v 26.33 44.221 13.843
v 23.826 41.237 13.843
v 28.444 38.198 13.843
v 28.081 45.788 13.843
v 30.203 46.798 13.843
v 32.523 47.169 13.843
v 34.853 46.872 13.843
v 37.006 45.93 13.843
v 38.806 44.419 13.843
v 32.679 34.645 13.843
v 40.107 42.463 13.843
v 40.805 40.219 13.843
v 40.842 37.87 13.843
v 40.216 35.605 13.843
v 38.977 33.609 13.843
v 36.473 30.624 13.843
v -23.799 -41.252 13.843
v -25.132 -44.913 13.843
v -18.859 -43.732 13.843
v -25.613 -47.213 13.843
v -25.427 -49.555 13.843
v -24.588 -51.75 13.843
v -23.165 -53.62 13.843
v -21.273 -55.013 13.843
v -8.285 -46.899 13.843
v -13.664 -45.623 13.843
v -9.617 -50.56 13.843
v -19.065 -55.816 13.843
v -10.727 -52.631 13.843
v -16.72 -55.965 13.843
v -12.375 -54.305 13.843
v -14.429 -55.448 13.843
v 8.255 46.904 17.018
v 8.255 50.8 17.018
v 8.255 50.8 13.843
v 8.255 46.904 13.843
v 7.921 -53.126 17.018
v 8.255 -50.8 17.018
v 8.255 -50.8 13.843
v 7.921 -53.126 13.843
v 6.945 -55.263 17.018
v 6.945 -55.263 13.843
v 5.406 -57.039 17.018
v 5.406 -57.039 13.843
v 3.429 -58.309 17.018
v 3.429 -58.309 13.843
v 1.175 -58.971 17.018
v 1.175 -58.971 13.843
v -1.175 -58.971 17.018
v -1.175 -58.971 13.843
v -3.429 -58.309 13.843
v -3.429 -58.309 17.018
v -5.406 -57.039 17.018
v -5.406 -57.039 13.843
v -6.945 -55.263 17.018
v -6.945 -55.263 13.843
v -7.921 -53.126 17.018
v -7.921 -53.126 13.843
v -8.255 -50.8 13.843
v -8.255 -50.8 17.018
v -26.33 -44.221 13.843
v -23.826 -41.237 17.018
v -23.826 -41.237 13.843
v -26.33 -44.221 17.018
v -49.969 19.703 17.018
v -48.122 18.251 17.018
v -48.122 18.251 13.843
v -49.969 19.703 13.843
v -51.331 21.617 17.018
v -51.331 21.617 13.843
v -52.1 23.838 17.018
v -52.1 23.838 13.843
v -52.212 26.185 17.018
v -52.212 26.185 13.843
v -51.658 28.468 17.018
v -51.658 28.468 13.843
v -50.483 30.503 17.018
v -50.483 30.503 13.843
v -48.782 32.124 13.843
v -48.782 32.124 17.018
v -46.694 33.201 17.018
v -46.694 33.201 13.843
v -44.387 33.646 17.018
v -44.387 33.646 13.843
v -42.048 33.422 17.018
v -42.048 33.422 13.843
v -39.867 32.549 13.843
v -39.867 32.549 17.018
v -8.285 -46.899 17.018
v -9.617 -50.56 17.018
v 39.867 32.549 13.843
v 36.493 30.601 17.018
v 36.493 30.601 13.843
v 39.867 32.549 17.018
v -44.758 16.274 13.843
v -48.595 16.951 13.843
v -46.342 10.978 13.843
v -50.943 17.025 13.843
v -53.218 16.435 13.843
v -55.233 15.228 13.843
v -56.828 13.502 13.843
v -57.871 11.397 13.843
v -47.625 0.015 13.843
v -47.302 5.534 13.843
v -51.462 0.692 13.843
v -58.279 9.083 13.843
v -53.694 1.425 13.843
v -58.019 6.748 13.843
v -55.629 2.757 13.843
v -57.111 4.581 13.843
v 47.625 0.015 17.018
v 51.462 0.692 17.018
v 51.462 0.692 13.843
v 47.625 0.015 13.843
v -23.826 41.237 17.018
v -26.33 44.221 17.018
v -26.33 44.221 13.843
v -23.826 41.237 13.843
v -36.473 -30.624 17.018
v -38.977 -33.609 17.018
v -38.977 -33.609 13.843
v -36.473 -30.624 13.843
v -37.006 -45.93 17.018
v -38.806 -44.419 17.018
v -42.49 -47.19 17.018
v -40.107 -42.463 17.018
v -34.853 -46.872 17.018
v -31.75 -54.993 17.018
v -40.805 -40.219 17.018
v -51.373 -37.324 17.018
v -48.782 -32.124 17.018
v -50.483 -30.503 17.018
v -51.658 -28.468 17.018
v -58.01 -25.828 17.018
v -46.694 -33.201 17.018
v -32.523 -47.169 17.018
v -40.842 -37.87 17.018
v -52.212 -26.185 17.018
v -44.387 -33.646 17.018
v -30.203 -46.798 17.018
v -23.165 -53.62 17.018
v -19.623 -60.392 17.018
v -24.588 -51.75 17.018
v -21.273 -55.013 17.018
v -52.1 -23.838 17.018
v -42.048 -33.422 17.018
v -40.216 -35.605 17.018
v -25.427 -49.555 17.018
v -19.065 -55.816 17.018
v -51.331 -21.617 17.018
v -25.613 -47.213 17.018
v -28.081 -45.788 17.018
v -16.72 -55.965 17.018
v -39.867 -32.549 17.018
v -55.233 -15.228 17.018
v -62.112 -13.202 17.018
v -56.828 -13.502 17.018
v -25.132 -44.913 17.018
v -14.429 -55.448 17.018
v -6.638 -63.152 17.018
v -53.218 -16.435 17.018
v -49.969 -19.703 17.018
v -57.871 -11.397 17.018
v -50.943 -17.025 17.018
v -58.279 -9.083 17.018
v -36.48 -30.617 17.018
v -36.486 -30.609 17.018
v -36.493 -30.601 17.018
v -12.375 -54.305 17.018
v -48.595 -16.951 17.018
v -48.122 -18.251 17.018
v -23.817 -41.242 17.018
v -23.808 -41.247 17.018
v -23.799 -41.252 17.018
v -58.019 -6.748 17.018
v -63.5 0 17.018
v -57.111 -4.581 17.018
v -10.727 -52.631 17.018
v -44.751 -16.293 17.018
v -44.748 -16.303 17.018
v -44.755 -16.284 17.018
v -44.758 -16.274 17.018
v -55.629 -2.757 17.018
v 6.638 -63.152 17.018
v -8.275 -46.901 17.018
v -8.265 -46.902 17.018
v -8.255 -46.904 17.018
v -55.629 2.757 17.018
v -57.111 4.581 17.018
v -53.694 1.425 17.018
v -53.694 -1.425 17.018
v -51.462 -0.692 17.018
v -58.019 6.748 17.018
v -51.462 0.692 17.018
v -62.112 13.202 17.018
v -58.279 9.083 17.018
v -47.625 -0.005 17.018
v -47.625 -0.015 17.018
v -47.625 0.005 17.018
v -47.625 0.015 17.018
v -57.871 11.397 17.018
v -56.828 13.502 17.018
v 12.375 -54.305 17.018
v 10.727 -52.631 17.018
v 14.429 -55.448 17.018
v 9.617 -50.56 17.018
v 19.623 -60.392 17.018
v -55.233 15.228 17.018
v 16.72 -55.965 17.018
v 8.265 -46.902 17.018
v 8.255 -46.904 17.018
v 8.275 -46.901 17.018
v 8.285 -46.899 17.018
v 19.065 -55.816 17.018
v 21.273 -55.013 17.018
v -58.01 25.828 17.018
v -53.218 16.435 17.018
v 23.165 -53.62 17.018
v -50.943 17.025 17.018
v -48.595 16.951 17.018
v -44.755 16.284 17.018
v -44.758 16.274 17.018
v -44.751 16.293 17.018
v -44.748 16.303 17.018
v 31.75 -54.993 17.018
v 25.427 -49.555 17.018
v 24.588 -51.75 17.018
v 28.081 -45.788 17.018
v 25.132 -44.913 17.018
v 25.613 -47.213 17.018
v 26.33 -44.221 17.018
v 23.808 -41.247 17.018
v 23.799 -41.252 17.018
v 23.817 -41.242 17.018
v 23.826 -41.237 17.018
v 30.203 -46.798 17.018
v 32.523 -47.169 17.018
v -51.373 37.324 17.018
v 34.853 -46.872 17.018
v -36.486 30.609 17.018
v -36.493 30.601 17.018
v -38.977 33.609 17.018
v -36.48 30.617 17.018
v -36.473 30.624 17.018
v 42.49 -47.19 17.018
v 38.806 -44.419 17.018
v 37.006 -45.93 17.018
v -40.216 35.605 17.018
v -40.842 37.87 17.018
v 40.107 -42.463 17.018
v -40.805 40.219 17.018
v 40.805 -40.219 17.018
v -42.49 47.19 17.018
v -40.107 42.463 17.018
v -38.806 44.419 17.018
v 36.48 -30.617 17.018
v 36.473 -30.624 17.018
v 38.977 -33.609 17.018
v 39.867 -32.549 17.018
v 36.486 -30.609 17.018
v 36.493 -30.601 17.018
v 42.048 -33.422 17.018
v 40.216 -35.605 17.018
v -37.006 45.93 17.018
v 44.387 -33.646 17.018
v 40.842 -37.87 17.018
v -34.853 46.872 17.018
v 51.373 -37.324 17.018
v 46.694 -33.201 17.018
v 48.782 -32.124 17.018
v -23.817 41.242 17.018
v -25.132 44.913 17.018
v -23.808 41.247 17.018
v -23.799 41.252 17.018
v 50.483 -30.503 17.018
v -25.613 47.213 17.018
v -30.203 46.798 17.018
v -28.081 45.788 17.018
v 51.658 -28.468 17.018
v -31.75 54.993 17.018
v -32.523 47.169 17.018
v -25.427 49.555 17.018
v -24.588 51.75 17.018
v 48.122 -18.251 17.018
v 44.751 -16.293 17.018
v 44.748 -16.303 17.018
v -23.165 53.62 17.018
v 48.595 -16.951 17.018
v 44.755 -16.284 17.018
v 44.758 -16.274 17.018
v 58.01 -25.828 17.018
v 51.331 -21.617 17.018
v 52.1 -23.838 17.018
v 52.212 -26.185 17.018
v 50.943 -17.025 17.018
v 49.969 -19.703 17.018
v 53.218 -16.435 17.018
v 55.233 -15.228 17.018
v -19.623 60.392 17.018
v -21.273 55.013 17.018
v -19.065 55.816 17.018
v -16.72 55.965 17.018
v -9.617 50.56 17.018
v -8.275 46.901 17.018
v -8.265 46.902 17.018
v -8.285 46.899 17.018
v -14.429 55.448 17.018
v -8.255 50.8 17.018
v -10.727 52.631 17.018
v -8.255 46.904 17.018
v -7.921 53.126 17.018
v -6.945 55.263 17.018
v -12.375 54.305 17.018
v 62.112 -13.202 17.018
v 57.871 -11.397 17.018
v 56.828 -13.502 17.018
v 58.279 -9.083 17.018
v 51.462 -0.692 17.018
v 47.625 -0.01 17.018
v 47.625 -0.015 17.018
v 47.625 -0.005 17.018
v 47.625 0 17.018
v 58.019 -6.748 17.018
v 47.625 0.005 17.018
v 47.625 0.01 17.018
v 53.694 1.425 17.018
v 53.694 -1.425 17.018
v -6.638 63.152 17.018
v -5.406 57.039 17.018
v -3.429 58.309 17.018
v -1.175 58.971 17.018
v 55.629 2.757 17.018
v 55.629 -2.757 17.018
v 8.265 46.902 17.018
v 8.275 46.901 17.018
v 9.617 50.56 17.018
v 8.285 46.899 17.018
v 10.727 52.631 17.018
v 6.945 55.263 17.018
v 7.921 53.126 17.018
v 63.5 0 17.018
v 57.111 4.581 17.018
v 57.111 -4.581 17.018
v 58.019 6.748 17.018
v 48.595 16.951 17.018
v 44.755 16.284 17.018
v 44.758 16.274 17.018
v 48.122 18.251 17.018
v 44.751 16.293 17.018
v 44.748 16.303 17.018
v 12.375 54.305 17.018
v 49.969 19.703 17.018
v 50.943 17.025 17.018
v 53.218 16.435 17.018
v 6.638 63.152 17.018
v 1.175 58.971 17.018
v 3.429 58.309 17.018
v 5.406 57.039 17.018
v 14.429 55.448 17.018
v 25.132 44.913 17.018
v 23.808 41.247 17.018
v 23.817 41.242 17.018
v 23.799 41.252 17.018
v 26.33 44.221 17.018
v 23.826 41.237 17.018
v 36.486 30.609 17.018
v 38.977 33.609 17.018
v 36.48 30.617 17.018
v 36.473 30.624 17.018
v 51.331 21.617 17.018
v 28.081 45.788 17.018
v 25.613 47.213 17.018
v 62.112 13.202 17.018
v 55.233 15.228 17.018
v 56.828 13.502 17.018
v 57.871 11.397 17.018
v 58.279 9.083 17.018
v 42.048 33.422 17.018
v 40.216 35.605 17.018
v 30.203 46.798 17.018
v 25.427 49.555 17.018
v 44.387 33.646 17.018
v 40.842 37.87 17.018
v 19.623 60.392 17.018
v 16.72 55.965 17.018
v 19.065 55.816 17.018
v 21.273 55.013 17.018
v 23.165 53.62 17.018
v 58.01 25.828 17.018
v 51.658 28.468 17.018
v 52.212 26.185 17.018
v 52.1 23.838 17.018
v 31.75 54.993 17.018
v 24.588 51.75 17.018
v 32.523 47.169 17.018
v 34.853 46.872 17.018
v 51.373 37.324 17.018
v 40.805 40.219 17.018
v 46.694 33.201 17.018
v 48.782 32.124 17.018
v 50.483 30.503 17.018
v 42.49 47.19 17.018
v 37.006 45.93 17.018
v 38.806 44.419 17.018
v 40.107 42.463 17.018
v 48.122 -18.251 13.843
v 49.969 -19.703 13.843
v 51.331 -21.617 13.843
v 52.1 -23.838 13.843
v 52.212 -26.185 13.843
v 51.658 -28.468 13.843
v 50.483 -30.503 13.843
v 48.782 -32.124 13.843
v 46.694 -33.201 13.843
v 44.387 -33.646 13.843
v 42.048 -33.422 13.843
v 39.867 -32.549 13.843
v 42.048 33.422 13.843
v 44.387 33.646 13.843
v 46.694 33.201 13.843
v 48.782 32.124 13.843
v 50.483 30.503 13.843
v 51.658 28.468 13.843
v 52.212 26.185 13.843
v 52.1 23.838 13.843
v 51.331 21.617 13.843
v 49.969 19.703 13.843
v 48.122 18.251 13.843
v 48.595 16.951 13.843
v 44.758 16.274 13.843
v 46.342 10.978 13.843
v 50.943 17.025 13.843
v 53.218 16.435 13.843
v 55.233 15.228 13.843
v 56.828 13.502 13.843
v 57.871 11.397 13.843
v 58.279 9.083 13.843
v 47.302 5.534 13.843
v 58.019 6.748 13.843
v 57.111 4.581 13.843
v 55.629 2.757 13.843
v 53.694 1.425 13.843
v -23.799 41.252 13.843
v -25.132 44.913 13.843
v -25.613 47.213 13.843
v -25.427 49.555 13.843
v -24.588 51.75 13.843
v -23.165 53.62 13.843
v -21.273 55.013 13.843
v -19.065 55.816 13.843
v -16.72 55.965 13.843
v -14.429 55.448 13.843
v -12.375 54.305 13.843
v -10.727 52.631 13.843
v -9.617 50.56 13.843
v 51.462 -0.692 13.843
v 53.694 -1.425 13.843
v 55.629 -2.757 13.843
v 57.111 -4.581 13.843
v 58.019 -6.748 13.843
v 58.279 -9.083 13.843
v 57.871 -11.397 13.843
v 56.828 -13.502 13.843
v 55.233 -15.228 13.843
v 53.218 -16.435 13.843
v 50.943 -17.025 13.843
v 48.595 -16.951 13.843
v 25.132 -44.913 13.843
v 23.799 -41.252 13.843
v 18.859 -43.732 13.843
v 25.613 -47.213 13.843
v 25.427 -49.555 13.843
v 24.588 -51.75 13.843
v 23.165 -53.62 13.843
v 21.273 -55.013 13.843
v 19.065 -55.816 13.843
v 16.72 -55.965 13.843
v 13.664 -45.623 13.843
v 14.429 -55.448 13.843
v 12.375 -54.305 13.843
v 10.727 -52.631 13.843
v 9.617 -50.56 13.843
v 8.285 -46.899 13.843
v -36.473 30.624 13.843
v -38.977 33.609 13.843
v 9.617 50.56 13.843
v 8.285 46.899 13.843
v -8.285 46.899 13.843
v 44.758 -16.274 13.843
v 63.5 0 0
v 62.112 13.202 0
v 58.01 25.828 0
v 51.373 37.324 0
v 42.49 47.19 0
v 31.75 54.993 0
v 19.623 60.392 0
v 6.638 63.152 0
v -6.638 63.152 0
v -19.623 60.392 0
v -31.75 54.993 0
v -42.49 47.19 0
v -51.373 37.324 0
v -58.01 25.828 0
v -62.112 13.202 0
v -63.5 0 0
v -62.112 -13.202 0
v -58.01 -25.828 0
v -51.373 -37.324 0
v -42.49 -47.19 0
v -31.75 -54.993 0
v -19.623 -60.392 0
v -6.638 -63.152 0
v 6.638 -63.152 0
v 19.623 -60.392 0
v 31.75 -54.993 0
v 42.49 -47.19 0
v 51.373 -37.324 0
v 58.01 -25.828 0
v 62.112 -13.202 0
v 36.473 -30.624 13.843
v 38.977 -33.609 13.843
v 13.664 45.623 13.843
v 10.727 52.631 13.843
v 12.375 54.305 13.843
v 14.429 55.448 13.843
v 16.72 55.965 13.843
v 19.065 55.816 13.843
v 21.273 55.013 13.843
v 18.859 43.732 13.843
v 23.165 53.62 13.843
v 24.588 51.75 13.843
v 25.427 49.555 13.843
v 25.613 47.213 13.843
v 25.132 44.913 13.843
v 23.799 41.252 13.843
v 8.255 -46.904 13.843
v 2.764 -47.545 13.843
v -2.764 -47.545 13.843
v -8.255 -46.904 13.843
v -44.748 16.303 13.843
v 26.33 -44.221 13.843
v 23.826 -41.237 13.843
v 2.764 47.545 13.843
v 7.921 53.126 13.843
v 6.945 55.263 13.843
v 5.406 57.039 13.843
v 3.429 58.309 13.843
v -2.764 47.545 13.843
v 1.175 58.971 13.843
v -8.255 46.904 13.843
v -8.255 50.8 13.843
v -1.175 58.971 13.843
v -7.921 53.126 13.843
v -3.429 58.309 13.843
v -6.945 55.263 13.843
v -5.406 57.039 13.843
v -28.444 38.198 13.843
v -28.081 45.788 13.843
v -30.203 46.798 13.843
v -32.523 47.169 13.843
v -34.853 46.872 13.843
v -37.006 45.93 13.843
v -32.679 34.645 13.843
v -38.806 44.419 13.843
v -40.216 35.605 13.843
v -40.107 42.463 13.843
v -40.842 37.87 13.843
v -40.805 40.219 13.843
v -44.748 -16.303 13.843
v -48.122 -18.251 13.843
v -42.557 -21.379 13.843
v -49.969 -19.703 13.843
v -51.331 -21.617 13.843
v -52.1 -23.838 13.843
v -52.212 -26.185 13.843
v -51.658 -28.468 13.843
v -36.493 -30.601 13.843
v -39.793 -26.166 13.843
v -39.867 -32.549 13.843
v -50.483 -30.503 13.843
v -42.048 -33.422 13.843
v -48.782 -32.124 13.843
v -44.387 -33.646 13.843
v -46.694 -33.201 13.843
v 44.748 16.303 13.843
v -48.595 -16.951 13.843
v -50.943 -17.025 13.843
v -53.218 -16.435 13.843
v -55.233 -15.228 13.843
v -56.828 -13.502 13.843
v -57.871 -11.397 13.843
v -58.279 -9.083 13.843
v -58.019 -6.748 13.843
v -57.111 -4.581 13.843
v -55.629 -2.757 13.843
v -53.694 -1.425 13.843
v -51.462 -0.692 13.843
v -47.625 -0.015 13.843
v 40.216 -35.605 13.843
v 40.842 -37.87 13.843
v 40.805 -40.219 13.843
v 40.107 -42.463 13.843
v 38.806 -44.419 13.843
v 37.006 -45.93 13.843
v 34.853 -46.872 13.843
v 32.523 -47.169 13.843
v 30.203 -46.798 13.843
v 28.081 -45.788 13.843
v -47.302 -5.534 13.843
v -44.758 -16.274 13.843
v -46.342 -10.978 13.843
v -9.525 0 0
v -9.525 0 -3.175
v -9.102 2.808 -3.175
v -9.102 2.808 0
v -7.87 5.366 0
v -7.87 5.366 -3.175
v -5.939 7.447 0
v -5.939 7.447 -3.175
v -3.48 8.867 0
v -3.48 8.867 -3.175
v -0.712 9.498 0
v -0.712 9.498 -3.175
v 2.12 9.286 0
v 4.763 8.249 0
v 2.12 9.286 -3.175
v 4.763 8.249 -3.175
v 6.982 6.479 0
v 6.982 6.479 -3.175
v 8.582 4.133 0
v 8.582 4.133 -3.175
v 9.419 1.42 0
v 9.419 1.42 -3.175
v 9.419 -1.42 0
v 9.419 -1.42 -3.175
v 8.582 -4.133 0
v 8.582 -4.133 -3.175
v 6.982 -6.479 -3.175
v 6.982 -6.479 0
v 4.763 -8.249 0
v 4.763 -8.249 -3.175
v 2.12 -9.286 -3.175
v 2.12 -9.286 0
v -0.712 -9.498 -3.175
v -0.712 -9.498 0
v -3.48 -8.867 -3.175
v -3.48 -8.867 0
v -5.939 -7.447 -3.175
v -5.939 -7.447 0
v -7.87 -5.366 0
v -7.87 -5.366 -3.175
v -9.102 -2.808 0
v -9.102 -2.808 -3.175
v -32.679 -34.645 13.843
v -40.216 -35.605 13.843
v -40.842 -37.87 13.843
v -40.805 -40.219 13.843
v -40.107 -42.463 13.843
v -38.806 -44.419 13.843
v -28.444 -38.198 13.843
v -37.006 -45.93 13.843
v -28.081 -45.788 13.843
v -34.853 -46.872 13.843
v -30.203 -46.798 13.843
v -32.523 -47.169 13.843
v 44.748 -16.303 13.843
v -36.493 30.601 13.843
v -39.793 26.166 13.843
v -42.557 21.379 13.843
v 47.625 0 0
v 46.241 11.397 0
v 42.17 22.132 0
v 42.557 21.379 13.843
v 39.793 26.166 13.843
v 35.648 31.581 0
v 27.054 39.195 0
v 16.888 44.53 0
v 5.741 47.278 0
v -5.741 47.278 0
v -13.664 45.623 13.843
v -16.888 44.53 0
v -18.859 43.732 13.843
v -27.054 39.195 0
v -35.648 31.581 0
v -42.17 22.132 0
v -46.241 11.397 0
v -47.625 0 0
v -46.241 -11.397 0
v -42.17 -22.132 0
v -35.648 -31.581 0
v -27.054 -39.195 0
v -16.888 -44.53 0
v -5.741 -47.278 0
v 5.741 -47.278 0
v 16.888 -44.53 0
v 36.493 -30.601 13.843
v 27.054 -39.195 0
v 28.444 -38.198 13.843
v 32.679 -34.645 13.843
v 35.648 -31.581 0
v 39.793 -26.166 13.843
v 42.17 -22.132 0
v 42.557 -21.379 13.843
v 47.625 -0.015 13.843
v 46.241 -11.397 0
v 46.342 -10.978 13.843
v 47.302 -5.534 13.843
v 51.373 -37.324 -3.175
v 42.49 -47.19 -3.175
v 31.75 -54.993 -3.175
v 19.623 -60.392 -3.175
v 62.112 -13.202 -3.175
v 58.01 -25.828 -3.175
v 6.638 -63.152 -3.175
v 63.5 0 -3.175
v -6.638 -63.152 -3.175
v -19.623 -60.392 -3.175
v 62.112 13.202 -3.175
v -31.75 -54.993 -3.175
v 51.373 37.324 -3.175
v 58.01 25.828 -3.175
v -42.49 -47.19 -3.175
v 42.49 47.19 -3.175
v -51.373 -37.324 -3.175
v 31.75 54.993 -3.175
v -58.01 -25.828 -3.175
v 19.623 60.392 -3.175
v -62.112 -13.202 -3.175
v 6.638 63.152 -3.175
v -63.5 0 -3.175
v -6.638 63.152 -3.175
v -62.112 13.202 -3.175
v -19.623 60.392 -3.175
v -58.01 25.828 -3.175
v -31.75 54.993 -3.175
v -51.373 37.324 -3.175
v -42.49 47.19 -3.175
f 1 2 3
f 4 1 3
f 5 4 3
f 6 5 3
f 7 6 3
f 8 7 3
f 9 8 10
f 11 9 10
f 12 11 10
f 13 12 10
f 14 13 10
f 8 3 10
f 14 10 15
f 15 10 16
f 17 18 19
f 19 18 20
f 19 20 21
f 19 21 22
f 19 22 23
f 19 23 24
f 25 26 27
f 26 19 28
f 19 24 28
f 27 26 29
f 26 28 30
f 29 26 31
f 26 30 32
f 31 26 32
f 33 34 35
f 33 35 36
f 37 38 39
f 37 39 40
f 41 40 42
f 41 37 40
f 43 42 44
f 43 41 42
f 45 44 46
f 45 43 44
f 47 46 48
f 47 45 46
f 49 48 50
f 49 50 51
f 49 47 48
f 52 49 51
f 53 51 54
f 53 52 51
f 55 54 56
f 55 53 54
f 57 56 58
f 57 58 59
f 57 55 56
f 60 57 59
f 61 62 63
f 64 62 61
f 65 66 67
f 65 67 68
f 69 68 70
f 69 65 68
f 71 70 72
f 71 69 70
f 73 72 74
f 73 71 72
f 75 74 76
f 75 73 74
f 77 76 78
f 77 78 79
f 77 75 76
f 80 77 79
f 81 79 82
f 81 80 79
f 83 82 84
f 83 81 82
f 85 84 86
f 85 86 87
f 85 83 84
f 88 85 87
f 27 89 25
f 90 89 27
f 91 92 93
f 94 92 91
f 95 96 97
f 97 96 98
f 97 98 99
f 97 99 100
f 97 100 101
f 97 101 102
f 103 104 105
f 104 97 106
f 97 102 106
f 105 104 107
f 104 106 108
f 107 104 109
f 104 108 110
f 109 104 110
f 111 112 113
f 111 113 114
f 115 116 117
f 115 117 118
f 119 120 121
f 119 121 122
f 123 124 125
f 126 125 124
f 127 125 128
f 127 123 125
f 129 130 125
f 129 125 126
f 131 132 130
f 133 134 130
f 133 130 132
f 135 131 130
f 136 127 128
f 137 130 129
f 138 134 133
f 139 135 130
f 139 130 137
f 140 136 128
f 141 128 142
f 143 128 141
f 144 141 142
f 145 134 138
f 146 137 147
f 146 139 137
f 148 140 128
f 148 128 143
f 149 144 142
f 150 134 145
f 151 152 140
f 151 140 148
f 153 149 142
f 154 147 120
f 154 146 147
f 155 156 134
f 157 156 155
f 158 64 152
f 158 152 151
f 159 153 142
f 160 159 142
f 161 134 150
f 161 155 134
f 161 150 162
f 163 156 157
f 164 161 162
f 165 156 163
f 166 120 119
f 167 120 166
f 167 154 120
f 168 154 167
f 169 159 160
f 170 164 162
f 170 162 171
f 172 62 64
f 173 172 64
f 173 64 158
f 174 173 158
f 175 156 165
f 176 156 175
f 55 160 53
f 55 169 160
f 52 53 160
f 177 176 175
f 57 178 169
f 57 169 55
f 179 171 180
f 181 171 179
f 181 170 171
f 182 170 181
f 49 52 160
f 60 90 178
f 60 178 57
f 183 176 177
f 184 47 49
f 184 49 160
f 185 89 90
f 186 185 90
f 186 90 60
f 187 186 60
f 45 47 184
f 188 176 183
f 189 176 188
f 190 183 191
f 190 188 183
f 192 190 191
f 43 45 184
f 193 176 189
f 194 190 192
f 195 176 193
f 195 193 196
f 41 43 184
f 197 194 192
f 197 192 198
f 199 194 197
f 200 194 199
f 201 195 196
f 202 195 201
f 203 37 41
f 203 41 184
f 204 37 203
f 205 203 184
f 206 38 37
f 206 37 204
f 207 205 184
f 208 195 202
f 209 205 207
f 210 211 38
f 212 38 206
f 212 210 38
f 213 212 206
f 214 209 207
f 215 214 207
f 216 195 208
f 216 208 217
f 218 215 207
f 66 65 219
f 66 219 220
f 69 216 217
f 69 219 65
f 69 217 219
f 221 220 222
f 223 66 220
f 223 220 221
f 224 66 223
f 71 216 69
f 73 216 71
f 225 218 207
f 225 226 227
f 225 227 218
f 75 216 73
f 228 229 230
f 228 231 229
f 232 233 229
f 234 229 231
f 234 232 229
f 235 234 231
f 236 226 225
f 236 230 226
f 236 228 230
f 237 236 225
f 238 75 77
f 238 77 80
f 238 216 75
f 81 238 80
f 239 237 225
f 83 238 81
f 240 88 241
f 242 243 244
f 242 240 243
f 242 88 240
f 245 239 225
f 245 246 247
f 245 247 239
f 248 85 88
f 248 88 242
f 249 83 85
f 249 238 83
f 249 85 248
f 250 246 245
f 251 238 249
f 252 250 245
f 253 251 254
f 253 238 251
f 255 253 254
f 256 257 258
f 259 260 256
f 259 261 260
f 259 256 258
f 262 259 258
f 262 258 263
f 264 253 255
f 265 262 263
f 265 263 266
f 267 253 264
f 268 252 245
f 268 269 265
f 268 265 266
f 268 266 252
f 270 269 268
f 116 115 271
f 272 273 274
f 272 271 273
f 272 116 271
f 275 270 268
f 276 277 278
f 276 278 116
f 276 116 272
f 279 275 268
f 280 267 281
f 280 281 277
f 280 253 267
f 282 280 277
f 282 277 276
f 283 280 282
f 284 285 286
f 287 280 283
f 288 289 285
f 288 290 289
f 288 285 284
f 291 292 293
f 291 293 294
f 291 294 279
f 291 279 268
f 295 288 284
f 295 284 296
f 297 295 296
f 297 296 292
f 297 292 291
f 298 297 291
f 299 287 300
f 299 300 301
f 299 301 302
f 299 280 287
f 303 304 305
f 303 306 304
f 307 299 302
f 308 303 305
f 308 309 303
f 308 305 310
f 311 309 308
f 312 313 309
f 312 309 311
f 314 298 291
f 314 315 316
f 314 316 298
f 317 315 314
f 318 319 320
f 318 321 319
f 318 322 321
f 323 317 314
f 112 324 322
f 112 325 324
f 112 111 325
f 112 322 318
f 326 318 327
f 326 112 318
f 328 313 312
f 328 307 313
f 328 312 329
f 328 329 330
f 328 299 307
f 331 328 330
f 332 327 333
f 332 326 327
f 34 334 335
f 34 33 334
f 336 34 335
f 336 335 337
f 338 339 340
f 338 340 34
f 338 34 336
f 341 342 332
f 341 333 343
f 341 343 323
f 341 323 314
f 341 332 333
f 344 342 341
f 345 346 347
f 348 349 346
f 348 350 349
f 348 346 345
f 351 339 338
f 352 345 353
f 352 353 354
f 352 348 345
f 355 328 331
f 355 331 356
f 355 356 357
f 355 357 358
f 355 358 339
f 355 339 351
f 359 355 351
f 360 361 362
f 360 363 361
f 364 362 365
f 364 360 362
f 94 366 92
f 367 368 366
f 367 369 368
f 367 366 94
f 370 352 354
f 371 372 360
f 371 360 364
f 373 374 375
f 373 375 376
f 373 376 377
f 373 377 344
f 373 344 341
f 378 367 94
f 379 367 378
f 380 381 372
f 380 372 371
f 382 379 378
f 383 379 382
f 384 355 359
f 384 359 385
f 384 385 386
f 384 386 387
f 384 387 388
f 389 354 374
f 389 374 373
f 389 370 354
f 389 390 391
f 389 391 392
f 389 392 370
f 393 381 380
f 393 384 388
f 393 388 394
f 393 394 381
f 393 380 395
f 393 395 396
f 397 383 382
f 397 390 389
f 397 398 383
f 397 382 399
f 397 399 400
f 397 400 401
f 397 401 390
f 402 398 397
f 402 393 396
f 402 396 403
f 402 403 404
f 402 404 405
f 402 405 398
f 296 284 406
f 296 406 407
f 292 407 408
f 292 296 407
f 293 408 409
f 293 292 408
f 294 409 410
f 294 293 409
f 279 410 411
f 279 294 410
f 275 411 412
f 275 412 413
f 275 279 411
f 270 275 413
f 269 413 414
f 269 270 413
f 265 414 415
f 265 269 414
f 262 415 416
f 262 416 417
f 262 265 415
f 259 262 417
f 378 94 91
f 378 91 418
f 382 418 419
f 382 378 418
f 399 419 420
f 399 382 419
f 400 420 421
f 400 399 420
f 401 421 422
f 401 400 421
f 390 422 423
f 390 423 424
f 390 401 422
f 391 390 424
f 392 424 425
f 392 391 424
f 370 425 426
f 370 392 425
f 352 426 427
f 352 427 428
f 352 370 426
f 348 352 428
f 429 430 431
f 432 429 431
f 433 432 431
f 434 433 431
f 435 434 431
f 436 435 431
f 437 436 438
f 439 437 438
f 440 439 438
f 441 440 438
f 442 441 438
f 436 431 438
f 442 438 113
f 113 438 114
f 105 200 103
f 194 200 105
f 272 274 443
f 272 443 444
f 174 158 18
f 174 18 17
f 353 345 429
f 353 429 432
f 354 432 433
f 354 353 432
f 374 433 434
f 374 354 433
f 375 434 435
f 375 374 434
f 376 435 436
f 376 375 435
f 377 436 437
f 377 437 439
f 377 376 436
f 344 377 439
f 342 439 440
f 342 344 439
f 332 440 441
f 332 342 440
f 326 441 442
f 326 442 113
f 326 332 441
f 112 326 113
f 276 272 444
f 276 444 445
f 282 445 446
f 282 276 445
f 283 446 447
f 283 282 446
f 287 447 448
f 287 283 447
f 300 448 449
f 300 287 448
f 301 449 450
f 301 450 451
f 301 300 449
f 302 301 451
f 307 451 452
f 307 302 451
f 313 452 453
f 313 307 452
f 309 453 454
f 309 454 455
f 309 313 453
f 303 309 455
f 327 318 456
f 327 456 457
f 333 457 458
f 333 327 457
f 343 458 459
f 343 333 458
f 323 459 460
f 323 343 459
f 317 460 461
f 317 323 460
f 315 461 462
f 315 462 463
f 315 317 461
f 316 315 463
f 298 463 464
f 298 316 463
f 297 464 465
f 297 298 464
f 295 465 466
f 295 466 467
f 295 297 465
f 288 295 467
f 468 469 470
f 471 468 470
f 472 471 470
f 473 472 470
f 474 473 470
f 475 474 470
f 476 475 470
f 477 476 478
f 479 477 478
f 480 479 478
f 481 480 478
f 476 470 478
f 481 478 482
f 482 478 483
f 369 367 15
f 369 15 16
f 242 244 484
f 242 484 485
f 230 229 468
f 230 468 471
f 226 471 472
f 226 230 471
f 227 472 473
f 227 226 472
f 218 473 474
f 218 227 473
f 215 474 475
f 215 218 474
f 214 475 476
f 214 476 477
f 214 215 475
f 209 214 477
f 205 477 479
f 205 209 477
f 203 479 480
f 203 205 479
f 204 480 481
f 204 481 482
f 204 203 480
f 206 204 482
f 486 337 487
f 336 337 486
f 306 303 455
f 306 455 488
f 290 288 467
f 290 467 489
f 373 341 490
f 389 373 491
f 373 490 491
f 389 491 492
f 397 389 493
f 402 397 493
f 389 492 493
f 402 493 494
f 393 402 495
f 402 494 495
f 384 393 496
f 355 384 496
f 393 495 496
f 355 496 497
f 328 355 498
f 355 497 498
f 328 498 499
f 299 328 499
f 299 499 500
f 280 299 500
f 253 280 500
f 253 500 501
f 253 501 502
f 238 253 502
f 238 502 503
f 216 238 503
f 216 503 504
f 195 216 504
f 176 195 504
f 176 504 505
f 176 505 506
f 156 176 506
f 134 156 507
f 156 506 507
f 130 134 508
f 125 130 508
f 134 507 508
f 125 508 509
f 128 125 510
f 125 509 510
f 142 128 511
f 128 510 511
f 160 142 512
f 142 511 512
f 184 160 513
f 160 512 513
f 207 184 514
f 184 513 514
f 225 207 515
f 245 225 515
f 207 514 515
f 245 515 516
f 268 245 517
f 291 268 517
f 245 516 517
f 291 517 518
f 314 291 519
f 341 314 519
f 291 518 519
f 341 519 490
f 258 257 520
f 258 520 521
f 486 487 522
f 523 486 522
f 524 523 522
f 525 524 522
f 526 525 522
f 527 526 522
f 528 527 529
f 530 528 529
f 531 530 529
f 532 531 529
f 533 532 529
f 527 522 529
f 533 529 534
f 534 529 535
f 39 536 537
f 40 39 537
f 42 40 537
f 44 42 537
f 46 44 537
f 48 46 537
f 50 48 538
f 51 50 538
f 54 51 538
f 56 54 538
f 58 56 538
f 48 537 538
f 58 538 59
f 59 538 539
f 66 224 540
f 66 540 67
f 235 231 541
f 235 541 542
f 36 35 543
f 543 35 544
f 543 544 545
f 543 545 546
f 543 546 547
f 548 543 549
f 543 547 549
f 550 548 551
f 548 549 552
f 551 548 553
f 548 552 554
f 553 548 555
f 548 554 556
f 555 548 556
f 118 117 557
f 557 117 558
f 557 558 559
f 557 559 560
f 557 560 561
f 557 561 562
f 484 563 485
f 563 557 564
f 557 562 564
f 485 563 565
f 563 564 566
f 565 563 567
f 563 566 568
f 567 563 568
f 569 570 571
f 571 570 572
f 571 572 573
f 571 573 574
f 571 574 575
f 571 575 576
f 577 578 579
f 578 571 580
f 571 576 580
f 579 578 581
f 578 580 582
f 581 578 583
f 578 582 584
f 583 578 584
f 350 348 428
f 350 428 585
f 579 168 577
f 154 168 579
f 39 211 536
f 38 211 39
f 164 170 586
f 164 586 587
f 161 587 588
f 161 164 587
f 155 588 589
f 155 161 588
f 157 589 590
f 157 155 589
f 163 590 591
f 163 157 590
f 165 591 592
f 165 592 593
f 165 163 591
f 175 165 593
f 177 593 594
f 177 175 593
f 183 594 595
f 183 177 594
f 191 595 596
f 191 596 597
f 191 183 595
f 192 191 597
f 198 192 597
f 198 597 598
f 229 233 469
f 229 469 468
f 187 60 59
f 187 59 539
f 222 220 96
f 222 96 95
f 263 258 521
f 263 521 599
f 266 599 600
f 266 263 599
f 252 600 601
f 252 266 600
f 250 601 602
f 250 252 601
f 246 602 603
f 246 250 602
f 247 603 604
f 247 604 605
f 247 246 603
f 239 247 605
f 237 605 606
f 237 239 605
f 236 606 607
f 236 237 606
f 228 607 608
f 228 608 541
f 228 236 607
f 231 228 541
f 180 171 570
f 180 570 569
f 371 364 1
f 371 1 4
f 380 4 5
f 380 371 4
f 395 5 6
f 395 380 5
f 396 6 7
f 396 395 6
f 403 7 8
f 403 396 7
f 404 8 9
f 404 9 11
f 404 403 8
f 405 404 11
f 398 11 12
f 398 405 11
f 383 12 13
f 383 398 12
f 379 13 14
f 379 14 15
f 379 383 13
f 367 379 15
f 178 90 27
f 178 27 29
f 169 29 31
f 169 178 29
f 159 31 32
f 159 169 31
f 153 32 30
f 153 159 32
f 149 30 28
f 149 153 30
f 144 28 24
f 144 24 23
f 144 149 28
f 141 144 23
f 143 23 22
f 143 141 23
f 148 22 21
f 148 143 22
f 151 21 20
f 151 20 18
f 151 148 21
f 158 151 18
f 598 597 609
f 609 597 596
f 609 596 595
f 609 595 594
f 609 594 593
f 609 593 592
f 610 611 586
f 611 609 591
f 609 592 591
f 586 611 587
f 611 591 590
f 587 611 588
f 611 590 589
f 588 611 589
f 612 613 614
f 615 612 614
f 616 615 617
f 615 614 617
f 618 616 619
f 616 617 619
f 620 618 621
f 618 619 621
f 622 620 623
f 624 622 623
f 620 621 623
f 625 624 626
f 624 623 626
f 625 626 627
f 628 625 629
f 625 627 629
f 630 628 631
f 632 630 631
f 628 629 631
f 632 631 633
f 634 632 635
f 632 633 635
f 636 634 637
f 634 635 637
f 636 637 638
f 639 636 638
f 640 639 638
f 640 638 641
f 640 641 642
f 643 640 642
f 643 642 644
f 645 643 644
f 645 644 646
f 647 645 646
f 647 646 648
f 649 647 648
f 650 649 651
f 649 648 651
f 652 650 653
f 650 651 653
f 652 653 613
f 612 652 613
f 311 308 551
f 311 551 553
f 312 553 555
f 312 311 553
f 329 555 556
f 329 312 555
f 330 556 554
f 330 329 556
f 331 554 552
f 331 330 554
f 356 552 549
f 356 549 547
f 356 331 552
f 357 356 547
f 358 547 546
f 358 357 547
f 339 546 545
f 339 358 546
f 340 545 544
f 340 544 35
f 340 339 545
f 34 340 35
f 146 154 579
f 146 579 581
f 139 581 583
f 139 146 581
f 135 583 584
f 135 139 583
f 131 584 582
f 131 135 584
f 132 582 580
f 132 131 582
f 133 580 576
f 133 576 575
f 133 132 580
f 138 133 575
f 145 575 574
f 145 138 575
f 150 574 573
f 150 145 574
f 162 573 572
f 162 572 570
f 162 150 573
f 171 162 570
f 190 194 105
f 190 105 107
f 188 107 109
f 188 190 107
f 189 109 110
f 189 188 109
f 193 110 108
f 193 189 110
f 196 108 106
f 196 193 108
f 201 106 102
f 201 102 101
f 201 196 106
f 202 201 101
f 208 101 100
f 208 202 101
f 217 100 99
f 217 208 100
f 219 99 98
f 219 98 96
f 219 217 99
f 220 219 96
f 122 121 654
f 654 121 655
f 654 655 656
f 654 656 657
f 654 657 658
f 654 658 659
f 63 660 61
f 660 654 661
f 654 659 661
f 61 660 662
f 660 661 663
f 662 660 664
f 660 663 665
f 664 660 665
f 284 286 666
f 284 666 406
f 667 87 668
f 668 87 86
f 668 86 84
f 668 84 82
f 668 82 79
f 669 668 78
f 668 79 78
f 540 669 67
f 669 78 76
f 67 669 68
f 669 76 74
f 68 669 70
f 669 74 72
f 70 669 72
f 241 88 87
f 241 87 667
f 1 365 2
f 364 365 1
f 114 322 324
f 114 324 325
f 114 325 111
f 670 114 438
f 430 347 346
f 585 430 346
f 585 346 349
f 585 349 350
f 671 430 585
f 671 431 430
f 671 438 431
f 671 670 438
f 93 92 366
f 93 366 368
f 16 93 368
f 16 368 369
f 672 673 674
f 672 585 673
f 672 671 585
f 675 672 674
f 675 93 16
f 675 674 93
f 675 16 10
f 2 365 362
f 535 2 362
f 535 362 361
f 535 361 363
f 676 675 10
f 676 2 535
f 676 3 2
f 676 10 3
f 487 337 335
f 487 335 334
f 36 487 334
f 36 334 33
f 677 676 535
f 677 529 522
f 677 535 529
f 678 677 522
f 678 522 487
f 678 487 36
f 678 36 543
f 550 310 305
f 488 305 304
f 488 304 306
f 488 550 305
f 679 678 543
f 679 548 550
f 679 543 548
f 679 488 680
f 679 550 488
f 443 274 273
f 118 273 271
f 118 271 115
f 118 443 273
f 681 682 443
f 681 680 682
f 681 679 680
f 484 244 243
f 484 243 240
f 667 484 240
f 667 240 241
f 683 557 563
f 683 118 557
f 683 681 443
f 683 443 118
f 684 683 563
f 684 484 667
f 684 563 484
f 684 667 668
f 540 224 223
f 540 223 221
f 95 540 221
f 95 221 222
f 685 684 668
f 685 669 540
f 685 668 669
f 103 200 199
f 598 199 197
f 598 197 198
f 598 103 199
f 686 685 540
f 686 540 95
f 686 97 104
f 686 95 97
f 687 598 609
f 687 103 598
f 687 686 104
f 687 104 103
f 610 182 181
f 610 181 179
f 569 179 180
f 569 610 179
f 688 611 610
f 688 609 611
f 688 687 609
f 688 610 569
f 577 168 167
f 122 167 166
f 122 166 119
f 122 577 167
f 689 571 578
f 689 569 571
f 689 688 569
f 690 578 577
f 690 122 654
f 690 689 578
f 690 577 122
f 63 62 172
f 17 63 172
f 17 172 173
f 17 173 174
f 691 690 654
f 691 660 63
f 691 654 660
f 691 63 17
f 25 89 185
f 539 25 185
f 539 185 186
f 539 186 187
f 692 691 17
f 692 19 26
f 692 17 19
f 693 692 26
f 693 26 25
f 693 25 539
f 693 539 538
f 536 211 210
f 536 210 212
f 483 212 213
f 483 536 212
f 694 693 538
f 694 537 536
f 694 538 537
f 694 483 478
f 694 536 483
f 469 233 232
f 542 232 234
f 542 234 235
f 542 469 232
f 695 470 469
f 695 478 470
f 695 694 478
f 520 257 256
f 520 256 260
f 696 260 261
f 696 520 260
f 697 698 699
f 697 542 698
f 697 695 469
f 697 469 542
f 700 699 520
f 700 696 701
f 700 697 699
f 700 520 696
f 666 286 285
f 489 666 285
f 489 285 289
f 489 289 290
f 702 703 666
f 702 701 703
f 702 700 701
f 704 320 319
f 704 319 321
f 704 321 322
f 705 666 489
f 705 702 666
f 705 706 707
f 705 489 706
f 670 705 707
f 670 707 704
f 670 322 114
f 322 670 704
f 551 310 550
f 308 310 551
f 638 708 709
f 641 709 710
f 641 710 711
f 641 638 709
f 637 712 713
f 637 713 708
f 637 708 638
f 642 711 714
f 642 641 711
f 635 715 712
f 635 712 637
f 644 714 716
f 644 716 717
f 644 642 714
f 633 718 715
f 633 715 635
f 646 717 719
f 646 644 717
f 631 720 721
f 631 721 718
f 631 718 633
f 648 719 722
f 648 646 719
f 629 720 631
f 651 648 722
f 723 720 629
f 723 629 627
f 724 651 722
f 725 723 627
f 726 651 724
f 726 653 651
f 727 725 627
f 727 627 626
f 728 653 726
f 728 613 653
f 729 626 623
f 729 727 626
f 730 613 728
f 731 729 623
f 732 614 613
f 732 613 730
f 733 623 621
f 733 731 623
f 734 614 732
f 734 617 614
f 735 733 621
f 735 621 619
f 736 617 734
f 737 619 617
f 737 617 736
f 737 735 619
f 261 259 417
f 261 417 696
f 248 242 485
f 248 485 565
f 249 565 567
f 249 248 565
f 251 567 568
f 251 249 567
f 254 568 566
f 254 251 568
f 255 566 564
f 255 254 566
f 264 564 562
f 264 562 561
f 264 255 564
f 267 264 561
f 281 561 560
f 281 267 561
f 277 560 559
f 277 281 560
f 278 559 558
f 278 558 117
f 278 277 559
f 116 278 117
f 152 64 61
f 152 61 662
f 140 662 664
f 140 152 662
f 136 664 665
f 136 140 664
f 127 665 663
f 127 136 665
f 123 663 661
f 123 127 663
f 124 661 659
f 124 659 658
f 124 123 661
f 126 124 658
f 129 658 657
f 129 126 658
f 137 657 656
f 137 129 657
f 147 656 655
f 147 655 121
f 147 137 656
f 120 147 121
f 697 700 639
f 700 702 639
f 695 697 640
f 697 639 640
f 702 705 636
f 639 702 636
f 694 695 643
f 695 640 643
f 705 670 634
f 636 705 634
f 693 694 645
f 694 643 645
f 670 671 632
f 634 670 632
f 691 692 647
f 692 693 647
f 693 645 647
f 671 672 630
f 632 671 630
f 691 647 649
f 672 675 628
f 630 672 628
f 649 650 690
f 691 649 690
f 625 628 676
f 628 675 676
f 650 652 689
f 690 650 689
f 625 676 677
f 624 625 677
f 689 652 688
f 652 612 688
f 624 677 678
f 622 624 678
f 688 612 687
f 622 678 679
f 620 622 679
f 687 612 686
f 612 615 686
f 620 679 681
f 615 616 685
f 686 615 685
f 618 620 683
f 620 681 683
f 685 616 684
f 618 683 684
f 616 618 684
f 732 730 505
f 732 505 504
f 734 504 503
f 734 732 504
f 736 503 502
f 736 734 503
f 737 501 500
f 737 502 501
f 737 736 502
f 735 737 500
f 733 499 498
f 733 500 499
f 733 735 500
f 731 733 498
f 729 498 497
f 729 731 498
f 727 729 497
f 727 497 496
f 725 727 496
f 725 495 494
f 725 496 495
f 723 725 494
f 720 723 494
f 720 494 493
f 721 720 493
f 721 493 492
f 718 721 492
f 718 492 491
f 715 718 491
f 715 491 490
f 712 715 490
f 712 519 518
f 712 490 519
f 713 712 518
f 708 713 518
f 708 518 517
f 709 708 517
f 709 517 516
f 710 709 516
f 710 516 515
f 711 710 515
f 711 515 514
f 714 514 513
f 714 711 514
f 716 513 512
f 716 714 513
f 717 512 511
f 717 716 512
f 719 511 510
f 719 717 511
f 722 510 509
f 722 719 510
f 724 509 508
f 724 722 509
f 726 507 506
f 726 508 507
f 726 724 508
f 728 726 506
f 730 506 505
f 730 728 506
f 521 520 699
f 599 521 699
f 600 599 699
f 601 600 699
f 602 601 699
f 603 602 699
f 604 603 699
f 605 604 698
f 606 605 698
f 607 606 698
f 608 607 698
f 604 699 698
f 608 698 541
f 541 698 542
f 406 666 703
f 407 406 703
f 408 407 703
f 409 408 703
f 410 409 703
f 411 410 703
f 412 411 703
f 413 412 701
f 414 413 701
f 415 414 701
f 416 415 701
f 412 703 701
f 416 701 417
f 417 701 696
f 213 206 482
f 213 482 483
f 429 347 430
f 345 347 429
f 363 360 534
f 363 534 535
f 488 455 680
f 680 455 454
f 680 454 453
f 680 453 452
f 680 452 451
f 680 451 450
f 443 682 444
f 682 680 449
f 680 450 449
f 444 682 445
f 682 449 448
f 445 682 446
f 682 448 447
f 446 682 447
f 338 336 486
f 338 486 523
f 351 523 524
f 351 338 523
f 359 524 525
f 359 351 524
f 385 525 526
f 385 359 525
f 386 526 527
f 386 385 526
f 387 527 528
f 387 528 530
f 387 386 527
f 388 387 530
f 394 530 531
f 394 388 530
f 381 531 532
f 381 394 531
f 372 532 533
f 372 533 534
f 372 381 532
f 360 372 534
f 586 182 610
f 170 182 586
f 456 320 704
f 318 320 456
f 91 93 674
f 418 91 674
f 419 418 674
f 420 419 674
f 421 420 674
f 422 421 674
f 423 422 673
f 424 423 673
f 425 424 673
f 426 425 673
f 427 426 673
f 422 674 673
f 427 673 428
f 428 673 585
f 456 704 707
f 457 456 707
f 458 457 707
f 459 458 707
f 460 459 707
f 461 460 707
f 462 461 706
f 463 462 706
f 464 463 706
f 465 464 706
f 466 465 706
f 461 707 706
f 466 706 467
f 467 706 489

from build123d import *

# Parameters (mm, degrees)
SKETCH1_R           = 63.5
SKETCH1_R_2         = 47.625
BOSS_EXTRUDE1_DEPTH = 17.018
CUT_EXTRUDE1_DEPTH  = 3.175
CIRPATTERN1_COUNT   = 10
CIRPATTERN1_ANGLE   = 180
BOSS_EXTRUDE2_START = 3.175
SKETCH3_R           = 63.5
SKETCH3_R_2         = 9.525
BOSS_EXTRUDE2_DEPTH = 3.175


with BuildPart() as part:
    # Sketch1 → Boss-Extrude1 (new body)
    with BuildSketch(Plane.XY):
        Circle(SKETCH1_R)
        Circle(SKETCH1_R_2, mode=Mode.SUBTRACT)
    extrude(amount=BOSS_EXTRUDE1_DEPTH)

    # Sketch2 → Cut-Extrude1 (cut)
    with BuildSketch(Plane.XY.offset(17.018)):
        with BuildLine():
            Line((8.255, 50.8), (8.255, -50.8))
            ThreePointArc((8.255, -50.8), (0, -59.055), (-8.255, -50.8))
            Line((-8.255, -50.8), (-8.255, 50.8))
            ThreePointArc((-8.255, 50.8), (0, 59.055), (8.255, 50.8))
        make_face()
    cut_extrude1 = extrude(amount=-CUT_EXTRUDE1_DEPTH, mode=Mode.SUBTRACT)

    # CirPattern1: Cut-Extrude1 ×10 about axis
    cirpattern1_axis = Axis((0, 0, 0), (0, 0, 1))
    for i in range(1, CIRPATTERN1_COUNT):
        add(cut_extrude1.rotate(cirpattern1_axis, i * CIRPATTERN1_ANGLE / (CIRPATTERN1_COUNT - 1)), mode=Mode.SUBTRACT)

    # Sketch3 → Boss-Extrude2 (add)
    with BuildSketch(Plane(origin=(0, 0, 0), x_dir=(-1, 0, 0), z_dir=(0, 0, -1)).offset(BOSS_EXTRUDE2_START)):
        Circle(SKETCH3_R)
        Circle(SKETCH3_R_2, mode=Mode.SUBTRACT)
    extrude(amount=-BOSS_EXTRUDE2_DEPTH)


solid = part.part
